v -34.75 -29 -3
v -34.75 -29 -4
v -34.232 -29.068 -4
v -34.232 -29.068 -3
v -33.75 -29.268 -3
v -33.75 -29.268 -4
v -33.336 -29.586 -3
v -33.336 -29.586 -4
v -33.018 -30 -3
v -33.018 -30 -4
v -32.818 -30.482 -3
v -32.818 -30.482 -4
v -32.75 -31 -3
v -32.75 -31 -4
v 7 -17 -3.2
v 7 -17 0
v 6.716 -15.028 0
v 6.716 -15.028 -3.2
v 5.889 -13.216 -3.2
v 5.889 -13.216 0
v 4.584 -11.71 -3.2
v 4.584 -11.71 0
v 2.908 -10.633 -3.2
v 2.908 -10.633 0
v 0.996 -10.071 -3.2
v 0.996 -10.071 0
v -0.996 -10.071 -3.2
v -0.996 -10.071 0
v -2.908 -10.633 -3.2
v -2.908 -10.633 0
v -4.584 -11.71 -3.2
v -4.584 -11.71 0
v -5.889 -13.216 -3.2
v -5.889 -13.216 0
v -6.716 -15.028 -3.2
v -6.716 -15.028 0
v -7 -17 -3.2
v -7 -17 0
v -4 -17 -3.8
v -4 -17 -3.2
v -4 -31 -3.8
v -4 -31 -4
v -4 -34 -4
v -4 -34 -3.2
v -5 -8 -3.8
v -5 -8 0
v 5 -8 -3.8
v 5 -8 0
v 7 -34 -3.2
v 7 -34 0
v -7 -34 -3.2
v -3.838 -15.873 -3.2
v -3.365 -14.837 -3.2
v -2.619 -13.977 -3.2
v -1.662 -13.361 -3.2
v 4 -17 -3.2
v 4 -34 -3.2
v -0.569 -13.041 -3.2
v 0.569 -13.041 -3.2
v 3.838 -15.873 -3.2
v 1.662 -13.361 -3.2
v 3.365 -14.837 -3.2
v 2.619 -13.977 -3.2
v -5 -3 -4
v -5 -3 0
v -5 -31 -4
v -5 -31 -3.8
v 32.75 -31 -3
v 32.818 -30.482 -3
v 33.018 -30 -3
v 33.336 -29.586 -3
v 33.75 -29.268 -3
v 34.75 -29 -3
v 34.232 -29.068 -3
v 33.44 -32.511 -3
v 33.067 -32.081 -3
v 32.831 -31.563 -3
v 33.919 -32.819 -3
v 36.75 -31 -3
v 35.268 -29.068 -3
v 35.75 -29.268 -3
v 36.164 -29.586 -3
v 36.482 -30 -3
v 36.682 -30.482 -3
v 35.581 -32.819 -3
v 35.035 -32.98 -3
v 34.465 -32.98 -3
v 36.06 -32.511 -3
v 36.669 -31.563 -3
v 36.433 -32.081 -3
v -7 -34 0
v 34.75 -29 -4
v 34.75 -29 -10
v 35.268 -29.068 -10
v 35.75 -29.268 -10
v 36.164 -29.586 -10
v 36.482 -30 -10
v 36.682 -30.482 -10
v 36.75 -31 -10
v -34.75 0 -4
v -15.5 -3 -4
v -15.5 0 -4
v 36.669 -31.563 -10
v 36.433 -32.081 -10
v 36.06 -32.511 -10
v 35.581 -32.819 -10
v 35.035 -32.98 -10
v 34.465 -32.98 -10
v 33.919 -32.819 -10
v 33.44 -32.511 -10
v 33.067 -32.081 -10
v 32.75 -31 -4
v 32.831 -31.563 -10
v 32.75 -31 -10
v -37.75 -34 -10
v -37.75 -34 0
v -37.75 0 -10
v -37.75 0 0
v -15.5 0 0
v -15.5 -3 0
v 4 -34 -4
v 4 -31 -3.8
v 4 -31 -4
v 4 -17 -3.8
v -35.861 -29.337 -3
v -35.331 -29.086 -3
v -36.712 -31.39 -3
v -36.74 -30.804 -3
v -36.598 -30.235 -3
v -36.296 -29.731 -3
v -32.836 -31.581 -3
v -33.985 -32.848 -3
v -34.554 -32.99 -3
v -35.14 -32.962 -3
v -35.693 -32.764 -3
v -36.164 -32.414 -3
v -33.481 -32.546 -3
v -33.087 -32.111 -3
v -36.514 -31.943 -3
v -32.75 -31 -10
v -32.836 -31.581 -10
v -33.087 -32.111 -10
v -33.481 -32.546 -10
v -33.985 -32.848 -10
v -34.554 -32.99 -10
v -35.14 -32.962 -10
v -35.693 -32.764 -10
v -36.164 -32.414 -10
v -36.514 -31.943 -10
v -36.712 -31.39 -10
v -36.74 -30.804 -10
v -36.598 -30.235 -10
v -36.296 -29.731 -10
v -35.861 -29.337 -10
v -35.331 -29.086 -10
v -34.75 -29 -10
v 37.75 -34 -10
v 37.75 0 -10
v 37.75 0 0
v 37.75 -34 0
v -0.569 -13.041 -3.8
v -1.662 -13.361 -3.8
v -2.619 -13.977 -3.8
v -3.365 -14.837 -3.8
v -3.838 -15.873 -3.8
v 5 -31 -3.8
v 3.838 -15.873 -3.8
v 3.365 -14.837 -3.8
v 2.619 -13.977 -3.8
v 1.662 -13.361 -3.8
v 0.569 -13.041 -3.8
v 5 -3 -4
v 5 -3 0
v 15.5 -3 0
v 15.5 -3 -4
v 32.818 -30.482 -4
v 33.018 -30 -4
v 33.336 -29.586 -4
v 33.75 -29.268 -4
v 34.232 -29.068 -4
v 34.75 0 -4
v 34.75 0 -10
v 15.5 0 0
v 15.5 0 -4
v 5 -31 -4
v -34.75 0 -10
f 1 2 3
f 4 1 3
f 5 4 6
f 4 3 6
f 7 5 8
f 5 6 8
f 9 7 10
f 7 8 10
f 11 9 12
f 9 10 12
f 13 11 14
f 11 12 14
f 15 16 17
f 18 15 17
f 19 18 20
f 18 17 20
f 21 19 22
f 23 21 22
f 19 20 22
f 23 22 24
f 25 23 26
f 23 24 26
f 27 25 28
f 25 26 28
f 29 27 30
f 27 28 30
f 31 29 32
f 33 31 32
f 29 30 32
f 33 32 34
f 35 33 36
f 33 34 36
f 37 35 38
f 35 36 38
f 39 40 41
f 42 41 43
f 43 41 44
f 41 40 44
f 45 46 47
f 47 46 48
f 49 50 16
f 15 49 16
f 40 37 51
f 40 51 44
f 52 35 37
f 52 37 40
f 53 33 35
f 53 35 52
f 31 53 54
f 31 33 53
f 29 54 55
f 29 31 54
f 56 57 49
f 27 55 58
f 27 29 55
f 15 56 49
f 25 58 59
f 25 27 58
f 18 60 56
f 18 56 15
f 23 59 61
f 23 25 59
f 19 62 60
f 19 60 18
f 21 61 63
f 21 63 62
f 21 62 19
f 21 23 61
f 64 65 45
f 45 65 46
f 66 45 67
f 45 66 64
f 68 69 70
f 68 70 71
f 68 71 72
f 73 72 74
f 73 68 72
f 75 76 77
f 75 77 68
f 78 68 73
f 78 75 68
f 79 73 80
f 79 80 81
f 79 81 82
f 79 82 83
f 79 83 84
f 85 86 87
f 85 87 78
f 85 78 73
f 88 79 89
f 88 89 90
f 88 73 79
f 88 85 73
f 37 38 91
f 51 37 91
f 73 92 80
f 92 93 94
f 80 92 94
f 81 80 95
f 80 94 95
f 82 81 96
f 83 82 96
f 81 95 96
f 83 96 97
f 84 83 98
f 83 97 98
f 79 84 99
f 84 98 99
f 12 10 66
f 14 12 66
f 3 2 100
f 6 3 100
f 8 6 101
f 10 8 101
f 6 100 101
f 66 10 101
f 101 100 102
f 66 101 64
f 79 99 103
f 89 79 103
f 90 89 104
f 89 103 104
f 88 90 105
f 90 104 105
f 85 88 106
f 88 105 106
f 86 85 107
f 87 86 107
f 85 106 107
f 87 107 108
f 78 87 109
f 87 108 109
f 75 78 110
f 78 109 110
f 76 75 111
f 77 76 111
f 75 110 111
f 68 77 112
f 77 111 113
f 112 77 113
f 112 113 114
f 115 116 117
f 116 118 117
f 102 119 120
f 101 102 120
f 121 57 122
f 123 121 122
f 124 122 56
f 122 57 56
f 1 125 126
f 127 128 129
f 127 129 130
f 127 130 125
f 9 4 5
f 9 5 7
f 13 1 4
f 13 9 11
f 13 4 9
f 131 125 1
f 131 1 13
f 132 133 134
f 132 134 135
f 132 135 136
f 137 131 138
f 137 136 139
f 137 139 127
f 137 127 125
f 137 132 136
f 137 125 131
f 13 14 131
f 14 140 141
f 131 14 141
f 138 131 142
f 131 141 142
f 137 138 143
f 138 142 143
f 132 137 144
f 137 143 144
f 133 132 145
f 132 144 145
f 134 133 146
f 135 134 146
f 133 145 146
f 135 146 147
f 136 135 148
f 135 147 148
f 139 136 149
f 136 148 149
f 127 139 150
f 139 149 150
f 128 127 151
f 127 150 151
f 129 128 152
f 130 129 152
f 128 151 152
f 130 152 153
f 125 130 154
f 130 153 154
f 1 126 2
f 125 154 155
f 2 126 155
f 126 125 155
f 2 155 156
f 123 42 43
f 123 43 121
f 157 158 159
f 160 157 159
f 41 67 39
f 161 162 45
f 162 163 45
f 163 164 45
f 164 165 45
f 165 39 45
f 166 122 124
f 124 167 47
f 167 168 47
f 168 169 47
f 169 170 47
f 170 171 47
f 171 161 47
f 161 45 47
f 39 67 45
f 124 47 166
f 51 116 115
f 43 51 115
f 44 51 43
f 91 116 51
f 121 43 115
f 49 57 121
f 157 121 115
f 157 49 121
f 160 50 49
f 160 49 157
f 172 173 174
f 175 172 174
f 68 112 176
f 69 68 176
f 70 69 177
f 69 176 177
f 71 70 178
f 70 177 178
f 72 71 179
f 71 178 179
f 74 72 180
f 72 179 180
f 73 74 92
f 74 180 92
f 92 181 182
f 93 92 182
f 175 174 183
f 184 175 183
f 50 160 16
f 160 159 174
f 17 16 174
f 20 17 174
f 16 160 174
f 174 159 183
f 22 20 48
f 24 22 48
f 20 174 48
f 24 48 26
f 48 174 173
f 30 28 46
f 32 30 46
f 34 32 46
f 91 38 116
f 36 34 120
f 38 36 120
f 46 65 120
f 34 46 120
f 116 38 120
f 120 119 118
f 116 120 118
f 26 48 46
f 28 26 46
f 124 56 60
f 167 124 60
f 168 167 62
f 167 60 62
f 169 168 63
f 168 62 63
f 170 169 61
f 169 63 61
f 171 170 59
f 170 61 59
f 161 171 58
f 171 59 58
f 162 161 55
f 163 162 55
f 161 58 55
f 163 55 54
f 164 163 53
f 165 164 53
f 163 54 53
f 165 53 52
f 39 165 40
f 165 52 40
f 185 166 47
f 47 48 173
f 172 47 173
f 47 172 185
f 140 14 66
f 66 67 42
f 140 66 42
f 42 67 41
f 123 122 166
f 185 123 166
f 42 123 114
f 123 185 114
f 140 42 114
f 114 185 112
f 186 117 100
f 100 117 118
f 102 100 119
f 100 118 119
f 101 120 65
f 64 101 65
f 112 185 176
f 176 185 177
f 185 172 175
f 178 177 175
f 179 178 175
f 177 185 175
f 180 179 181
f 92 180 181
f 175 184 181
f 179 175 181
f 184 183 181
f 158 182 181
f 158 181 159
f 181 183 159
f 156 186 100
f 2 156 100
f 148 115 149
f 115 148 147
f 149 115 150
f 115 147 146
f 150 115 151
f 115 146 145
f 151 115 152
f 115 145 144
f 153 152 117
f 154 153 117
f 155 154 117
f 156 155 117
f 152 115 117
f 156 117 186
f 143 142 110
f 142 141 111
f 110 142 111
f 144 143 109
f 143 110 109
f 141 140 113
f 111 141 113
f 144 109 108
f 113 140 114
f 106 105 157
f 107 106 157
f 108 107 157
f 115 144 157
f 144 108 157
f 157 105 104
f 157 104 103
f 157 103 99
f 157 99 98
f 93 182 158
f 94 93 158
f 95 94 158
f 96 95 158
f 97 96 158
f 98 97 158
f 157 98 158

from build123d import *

# Parameters (mm, degrees)
F1_DEPTH = 31
F3_DEPTH = 3
F5_DEPTH = 4
F7_DEPTH = 3.2
F9_DEPTH = 7


with BuildPart() as f1:
    # F0 (on Front) → F1 (new body)
    with BuildSketch(Plane.XZ):
        Polygon((37.75, 0), (-37.75, 0), (-37.75, -10), (-34.75, -10), (-34.75, -4), (-5, -4), (-5, -3.8), (5, -3.8), (5, -4), (34.75, -4), (34.75, -10), (37.75, -10), align=None)
    extrude(amount=F1_DEPTH)

    # F2 (on face) → F3 (join)
    with BuildSketch(Plane.XZ.offset(31)):
        Polygon((37.75, 0), (-37.75, 0), (-37.75, -10), (-34.75, -10), (-34.75, -4), (-5, -4), (-5, -3.8), (5, -3.8), (5, -4), (34.75, -4), (34.75, -10), (37.75, -10), align=None)
        Polygon((-34.75, -4), (-34.75, -10), (34.75, -10), (34.75, -4), (5, -4), (5, -3.8), (-5, -3.8), (-5, -4), align=None)
    extrude(amount=F3_DEPTH)

    # F4 (on face) → F5 (cut)
    with BuildSketch(Plane.XY):
        with BuildLine():
            Line((-4, -17), (-4, -34))
            Line((-4, -34), (4, -34))
            Line((4, -34), (4, -17))
            ThreePointArc((4, -17), (0, -13), (-4, -17))
        make_face()
        Polygon((15.5, 0), (-15.5, 0), (-15.5, -3), (-5, -3), (-5, -8), (5, -8), (5, -3), (15.5, -3), align=None)
    extrude(amount=-F5_DEPTH, mode=Mode.SUBTRACT)

    # F6 (on face) → F7 (cut)
    with BuildSketch(Plane.XY):
        with BuildLine():
            Line((-7, -17), (-7, -34))
            Line((-7, -34), (-4, -34))
            Line((-4, -34), (-4, -17))
            ThreePointArc((-4, -17), (0, -13), (4, -17))
            Line((4, -17), (4, -34))
            Line((4, -34), (7, -34))
            Line((7, -34), (7, -17))
            ThreePointArc((7, -17), (0, -10), (-7, -17))
        make_face()
    extrude(amount=-F7_DEPTH, mode=Mode.SUBTRACT)

    # F8 (on face) → F9 (cut)
    with BuildSketch(Plane(origin=(0, 0, -10), x_dir=(1, 0, 0), z_dir=(0, 0, -1))):
        with BuildLine():
            Line((-34.75, 31), (-32.75, 31))
            ThreePointArc((-32.75, 31), (-36.1642135624, 32.4142135624), (-34.75, 29))
            Line((-34.75, 29), (-34.75, 31))
        make_face()
        with BuildLine():
            ThreePointArc((-34.75, 29), (-33.3357864376, 29.5857864376), (-32.75, 31))
            Line((-32.75, 31), (-34.75, 31))
            Line((-34.75, 31), (-34.75, 29))
        make_face()
        with BuildLine():
            ThreePointArc((36.75, 31), (34.75, 33), (32.75, 31))
            Line((32.75, 31), (34.75, 31))
            Line((34.75, 31), (34.75, 29))
            ThreePointArc((34.75, 29), (36.1642135624, 29.5857864376), (36.75, 31))
        make_face()
        with BuildLine():
            Line((34.75, 31), (32.75, 31))
            ThreePointArc((32.75, 31), (33.3357864376, 29.5857864376), (34.75, 29))
            Line((34.75, 29), (34.75, 31))
        make_face()
    extrude(amount=-F9_DEPTH, mode=Mode.SUBTRACT)


solid = f1.part
